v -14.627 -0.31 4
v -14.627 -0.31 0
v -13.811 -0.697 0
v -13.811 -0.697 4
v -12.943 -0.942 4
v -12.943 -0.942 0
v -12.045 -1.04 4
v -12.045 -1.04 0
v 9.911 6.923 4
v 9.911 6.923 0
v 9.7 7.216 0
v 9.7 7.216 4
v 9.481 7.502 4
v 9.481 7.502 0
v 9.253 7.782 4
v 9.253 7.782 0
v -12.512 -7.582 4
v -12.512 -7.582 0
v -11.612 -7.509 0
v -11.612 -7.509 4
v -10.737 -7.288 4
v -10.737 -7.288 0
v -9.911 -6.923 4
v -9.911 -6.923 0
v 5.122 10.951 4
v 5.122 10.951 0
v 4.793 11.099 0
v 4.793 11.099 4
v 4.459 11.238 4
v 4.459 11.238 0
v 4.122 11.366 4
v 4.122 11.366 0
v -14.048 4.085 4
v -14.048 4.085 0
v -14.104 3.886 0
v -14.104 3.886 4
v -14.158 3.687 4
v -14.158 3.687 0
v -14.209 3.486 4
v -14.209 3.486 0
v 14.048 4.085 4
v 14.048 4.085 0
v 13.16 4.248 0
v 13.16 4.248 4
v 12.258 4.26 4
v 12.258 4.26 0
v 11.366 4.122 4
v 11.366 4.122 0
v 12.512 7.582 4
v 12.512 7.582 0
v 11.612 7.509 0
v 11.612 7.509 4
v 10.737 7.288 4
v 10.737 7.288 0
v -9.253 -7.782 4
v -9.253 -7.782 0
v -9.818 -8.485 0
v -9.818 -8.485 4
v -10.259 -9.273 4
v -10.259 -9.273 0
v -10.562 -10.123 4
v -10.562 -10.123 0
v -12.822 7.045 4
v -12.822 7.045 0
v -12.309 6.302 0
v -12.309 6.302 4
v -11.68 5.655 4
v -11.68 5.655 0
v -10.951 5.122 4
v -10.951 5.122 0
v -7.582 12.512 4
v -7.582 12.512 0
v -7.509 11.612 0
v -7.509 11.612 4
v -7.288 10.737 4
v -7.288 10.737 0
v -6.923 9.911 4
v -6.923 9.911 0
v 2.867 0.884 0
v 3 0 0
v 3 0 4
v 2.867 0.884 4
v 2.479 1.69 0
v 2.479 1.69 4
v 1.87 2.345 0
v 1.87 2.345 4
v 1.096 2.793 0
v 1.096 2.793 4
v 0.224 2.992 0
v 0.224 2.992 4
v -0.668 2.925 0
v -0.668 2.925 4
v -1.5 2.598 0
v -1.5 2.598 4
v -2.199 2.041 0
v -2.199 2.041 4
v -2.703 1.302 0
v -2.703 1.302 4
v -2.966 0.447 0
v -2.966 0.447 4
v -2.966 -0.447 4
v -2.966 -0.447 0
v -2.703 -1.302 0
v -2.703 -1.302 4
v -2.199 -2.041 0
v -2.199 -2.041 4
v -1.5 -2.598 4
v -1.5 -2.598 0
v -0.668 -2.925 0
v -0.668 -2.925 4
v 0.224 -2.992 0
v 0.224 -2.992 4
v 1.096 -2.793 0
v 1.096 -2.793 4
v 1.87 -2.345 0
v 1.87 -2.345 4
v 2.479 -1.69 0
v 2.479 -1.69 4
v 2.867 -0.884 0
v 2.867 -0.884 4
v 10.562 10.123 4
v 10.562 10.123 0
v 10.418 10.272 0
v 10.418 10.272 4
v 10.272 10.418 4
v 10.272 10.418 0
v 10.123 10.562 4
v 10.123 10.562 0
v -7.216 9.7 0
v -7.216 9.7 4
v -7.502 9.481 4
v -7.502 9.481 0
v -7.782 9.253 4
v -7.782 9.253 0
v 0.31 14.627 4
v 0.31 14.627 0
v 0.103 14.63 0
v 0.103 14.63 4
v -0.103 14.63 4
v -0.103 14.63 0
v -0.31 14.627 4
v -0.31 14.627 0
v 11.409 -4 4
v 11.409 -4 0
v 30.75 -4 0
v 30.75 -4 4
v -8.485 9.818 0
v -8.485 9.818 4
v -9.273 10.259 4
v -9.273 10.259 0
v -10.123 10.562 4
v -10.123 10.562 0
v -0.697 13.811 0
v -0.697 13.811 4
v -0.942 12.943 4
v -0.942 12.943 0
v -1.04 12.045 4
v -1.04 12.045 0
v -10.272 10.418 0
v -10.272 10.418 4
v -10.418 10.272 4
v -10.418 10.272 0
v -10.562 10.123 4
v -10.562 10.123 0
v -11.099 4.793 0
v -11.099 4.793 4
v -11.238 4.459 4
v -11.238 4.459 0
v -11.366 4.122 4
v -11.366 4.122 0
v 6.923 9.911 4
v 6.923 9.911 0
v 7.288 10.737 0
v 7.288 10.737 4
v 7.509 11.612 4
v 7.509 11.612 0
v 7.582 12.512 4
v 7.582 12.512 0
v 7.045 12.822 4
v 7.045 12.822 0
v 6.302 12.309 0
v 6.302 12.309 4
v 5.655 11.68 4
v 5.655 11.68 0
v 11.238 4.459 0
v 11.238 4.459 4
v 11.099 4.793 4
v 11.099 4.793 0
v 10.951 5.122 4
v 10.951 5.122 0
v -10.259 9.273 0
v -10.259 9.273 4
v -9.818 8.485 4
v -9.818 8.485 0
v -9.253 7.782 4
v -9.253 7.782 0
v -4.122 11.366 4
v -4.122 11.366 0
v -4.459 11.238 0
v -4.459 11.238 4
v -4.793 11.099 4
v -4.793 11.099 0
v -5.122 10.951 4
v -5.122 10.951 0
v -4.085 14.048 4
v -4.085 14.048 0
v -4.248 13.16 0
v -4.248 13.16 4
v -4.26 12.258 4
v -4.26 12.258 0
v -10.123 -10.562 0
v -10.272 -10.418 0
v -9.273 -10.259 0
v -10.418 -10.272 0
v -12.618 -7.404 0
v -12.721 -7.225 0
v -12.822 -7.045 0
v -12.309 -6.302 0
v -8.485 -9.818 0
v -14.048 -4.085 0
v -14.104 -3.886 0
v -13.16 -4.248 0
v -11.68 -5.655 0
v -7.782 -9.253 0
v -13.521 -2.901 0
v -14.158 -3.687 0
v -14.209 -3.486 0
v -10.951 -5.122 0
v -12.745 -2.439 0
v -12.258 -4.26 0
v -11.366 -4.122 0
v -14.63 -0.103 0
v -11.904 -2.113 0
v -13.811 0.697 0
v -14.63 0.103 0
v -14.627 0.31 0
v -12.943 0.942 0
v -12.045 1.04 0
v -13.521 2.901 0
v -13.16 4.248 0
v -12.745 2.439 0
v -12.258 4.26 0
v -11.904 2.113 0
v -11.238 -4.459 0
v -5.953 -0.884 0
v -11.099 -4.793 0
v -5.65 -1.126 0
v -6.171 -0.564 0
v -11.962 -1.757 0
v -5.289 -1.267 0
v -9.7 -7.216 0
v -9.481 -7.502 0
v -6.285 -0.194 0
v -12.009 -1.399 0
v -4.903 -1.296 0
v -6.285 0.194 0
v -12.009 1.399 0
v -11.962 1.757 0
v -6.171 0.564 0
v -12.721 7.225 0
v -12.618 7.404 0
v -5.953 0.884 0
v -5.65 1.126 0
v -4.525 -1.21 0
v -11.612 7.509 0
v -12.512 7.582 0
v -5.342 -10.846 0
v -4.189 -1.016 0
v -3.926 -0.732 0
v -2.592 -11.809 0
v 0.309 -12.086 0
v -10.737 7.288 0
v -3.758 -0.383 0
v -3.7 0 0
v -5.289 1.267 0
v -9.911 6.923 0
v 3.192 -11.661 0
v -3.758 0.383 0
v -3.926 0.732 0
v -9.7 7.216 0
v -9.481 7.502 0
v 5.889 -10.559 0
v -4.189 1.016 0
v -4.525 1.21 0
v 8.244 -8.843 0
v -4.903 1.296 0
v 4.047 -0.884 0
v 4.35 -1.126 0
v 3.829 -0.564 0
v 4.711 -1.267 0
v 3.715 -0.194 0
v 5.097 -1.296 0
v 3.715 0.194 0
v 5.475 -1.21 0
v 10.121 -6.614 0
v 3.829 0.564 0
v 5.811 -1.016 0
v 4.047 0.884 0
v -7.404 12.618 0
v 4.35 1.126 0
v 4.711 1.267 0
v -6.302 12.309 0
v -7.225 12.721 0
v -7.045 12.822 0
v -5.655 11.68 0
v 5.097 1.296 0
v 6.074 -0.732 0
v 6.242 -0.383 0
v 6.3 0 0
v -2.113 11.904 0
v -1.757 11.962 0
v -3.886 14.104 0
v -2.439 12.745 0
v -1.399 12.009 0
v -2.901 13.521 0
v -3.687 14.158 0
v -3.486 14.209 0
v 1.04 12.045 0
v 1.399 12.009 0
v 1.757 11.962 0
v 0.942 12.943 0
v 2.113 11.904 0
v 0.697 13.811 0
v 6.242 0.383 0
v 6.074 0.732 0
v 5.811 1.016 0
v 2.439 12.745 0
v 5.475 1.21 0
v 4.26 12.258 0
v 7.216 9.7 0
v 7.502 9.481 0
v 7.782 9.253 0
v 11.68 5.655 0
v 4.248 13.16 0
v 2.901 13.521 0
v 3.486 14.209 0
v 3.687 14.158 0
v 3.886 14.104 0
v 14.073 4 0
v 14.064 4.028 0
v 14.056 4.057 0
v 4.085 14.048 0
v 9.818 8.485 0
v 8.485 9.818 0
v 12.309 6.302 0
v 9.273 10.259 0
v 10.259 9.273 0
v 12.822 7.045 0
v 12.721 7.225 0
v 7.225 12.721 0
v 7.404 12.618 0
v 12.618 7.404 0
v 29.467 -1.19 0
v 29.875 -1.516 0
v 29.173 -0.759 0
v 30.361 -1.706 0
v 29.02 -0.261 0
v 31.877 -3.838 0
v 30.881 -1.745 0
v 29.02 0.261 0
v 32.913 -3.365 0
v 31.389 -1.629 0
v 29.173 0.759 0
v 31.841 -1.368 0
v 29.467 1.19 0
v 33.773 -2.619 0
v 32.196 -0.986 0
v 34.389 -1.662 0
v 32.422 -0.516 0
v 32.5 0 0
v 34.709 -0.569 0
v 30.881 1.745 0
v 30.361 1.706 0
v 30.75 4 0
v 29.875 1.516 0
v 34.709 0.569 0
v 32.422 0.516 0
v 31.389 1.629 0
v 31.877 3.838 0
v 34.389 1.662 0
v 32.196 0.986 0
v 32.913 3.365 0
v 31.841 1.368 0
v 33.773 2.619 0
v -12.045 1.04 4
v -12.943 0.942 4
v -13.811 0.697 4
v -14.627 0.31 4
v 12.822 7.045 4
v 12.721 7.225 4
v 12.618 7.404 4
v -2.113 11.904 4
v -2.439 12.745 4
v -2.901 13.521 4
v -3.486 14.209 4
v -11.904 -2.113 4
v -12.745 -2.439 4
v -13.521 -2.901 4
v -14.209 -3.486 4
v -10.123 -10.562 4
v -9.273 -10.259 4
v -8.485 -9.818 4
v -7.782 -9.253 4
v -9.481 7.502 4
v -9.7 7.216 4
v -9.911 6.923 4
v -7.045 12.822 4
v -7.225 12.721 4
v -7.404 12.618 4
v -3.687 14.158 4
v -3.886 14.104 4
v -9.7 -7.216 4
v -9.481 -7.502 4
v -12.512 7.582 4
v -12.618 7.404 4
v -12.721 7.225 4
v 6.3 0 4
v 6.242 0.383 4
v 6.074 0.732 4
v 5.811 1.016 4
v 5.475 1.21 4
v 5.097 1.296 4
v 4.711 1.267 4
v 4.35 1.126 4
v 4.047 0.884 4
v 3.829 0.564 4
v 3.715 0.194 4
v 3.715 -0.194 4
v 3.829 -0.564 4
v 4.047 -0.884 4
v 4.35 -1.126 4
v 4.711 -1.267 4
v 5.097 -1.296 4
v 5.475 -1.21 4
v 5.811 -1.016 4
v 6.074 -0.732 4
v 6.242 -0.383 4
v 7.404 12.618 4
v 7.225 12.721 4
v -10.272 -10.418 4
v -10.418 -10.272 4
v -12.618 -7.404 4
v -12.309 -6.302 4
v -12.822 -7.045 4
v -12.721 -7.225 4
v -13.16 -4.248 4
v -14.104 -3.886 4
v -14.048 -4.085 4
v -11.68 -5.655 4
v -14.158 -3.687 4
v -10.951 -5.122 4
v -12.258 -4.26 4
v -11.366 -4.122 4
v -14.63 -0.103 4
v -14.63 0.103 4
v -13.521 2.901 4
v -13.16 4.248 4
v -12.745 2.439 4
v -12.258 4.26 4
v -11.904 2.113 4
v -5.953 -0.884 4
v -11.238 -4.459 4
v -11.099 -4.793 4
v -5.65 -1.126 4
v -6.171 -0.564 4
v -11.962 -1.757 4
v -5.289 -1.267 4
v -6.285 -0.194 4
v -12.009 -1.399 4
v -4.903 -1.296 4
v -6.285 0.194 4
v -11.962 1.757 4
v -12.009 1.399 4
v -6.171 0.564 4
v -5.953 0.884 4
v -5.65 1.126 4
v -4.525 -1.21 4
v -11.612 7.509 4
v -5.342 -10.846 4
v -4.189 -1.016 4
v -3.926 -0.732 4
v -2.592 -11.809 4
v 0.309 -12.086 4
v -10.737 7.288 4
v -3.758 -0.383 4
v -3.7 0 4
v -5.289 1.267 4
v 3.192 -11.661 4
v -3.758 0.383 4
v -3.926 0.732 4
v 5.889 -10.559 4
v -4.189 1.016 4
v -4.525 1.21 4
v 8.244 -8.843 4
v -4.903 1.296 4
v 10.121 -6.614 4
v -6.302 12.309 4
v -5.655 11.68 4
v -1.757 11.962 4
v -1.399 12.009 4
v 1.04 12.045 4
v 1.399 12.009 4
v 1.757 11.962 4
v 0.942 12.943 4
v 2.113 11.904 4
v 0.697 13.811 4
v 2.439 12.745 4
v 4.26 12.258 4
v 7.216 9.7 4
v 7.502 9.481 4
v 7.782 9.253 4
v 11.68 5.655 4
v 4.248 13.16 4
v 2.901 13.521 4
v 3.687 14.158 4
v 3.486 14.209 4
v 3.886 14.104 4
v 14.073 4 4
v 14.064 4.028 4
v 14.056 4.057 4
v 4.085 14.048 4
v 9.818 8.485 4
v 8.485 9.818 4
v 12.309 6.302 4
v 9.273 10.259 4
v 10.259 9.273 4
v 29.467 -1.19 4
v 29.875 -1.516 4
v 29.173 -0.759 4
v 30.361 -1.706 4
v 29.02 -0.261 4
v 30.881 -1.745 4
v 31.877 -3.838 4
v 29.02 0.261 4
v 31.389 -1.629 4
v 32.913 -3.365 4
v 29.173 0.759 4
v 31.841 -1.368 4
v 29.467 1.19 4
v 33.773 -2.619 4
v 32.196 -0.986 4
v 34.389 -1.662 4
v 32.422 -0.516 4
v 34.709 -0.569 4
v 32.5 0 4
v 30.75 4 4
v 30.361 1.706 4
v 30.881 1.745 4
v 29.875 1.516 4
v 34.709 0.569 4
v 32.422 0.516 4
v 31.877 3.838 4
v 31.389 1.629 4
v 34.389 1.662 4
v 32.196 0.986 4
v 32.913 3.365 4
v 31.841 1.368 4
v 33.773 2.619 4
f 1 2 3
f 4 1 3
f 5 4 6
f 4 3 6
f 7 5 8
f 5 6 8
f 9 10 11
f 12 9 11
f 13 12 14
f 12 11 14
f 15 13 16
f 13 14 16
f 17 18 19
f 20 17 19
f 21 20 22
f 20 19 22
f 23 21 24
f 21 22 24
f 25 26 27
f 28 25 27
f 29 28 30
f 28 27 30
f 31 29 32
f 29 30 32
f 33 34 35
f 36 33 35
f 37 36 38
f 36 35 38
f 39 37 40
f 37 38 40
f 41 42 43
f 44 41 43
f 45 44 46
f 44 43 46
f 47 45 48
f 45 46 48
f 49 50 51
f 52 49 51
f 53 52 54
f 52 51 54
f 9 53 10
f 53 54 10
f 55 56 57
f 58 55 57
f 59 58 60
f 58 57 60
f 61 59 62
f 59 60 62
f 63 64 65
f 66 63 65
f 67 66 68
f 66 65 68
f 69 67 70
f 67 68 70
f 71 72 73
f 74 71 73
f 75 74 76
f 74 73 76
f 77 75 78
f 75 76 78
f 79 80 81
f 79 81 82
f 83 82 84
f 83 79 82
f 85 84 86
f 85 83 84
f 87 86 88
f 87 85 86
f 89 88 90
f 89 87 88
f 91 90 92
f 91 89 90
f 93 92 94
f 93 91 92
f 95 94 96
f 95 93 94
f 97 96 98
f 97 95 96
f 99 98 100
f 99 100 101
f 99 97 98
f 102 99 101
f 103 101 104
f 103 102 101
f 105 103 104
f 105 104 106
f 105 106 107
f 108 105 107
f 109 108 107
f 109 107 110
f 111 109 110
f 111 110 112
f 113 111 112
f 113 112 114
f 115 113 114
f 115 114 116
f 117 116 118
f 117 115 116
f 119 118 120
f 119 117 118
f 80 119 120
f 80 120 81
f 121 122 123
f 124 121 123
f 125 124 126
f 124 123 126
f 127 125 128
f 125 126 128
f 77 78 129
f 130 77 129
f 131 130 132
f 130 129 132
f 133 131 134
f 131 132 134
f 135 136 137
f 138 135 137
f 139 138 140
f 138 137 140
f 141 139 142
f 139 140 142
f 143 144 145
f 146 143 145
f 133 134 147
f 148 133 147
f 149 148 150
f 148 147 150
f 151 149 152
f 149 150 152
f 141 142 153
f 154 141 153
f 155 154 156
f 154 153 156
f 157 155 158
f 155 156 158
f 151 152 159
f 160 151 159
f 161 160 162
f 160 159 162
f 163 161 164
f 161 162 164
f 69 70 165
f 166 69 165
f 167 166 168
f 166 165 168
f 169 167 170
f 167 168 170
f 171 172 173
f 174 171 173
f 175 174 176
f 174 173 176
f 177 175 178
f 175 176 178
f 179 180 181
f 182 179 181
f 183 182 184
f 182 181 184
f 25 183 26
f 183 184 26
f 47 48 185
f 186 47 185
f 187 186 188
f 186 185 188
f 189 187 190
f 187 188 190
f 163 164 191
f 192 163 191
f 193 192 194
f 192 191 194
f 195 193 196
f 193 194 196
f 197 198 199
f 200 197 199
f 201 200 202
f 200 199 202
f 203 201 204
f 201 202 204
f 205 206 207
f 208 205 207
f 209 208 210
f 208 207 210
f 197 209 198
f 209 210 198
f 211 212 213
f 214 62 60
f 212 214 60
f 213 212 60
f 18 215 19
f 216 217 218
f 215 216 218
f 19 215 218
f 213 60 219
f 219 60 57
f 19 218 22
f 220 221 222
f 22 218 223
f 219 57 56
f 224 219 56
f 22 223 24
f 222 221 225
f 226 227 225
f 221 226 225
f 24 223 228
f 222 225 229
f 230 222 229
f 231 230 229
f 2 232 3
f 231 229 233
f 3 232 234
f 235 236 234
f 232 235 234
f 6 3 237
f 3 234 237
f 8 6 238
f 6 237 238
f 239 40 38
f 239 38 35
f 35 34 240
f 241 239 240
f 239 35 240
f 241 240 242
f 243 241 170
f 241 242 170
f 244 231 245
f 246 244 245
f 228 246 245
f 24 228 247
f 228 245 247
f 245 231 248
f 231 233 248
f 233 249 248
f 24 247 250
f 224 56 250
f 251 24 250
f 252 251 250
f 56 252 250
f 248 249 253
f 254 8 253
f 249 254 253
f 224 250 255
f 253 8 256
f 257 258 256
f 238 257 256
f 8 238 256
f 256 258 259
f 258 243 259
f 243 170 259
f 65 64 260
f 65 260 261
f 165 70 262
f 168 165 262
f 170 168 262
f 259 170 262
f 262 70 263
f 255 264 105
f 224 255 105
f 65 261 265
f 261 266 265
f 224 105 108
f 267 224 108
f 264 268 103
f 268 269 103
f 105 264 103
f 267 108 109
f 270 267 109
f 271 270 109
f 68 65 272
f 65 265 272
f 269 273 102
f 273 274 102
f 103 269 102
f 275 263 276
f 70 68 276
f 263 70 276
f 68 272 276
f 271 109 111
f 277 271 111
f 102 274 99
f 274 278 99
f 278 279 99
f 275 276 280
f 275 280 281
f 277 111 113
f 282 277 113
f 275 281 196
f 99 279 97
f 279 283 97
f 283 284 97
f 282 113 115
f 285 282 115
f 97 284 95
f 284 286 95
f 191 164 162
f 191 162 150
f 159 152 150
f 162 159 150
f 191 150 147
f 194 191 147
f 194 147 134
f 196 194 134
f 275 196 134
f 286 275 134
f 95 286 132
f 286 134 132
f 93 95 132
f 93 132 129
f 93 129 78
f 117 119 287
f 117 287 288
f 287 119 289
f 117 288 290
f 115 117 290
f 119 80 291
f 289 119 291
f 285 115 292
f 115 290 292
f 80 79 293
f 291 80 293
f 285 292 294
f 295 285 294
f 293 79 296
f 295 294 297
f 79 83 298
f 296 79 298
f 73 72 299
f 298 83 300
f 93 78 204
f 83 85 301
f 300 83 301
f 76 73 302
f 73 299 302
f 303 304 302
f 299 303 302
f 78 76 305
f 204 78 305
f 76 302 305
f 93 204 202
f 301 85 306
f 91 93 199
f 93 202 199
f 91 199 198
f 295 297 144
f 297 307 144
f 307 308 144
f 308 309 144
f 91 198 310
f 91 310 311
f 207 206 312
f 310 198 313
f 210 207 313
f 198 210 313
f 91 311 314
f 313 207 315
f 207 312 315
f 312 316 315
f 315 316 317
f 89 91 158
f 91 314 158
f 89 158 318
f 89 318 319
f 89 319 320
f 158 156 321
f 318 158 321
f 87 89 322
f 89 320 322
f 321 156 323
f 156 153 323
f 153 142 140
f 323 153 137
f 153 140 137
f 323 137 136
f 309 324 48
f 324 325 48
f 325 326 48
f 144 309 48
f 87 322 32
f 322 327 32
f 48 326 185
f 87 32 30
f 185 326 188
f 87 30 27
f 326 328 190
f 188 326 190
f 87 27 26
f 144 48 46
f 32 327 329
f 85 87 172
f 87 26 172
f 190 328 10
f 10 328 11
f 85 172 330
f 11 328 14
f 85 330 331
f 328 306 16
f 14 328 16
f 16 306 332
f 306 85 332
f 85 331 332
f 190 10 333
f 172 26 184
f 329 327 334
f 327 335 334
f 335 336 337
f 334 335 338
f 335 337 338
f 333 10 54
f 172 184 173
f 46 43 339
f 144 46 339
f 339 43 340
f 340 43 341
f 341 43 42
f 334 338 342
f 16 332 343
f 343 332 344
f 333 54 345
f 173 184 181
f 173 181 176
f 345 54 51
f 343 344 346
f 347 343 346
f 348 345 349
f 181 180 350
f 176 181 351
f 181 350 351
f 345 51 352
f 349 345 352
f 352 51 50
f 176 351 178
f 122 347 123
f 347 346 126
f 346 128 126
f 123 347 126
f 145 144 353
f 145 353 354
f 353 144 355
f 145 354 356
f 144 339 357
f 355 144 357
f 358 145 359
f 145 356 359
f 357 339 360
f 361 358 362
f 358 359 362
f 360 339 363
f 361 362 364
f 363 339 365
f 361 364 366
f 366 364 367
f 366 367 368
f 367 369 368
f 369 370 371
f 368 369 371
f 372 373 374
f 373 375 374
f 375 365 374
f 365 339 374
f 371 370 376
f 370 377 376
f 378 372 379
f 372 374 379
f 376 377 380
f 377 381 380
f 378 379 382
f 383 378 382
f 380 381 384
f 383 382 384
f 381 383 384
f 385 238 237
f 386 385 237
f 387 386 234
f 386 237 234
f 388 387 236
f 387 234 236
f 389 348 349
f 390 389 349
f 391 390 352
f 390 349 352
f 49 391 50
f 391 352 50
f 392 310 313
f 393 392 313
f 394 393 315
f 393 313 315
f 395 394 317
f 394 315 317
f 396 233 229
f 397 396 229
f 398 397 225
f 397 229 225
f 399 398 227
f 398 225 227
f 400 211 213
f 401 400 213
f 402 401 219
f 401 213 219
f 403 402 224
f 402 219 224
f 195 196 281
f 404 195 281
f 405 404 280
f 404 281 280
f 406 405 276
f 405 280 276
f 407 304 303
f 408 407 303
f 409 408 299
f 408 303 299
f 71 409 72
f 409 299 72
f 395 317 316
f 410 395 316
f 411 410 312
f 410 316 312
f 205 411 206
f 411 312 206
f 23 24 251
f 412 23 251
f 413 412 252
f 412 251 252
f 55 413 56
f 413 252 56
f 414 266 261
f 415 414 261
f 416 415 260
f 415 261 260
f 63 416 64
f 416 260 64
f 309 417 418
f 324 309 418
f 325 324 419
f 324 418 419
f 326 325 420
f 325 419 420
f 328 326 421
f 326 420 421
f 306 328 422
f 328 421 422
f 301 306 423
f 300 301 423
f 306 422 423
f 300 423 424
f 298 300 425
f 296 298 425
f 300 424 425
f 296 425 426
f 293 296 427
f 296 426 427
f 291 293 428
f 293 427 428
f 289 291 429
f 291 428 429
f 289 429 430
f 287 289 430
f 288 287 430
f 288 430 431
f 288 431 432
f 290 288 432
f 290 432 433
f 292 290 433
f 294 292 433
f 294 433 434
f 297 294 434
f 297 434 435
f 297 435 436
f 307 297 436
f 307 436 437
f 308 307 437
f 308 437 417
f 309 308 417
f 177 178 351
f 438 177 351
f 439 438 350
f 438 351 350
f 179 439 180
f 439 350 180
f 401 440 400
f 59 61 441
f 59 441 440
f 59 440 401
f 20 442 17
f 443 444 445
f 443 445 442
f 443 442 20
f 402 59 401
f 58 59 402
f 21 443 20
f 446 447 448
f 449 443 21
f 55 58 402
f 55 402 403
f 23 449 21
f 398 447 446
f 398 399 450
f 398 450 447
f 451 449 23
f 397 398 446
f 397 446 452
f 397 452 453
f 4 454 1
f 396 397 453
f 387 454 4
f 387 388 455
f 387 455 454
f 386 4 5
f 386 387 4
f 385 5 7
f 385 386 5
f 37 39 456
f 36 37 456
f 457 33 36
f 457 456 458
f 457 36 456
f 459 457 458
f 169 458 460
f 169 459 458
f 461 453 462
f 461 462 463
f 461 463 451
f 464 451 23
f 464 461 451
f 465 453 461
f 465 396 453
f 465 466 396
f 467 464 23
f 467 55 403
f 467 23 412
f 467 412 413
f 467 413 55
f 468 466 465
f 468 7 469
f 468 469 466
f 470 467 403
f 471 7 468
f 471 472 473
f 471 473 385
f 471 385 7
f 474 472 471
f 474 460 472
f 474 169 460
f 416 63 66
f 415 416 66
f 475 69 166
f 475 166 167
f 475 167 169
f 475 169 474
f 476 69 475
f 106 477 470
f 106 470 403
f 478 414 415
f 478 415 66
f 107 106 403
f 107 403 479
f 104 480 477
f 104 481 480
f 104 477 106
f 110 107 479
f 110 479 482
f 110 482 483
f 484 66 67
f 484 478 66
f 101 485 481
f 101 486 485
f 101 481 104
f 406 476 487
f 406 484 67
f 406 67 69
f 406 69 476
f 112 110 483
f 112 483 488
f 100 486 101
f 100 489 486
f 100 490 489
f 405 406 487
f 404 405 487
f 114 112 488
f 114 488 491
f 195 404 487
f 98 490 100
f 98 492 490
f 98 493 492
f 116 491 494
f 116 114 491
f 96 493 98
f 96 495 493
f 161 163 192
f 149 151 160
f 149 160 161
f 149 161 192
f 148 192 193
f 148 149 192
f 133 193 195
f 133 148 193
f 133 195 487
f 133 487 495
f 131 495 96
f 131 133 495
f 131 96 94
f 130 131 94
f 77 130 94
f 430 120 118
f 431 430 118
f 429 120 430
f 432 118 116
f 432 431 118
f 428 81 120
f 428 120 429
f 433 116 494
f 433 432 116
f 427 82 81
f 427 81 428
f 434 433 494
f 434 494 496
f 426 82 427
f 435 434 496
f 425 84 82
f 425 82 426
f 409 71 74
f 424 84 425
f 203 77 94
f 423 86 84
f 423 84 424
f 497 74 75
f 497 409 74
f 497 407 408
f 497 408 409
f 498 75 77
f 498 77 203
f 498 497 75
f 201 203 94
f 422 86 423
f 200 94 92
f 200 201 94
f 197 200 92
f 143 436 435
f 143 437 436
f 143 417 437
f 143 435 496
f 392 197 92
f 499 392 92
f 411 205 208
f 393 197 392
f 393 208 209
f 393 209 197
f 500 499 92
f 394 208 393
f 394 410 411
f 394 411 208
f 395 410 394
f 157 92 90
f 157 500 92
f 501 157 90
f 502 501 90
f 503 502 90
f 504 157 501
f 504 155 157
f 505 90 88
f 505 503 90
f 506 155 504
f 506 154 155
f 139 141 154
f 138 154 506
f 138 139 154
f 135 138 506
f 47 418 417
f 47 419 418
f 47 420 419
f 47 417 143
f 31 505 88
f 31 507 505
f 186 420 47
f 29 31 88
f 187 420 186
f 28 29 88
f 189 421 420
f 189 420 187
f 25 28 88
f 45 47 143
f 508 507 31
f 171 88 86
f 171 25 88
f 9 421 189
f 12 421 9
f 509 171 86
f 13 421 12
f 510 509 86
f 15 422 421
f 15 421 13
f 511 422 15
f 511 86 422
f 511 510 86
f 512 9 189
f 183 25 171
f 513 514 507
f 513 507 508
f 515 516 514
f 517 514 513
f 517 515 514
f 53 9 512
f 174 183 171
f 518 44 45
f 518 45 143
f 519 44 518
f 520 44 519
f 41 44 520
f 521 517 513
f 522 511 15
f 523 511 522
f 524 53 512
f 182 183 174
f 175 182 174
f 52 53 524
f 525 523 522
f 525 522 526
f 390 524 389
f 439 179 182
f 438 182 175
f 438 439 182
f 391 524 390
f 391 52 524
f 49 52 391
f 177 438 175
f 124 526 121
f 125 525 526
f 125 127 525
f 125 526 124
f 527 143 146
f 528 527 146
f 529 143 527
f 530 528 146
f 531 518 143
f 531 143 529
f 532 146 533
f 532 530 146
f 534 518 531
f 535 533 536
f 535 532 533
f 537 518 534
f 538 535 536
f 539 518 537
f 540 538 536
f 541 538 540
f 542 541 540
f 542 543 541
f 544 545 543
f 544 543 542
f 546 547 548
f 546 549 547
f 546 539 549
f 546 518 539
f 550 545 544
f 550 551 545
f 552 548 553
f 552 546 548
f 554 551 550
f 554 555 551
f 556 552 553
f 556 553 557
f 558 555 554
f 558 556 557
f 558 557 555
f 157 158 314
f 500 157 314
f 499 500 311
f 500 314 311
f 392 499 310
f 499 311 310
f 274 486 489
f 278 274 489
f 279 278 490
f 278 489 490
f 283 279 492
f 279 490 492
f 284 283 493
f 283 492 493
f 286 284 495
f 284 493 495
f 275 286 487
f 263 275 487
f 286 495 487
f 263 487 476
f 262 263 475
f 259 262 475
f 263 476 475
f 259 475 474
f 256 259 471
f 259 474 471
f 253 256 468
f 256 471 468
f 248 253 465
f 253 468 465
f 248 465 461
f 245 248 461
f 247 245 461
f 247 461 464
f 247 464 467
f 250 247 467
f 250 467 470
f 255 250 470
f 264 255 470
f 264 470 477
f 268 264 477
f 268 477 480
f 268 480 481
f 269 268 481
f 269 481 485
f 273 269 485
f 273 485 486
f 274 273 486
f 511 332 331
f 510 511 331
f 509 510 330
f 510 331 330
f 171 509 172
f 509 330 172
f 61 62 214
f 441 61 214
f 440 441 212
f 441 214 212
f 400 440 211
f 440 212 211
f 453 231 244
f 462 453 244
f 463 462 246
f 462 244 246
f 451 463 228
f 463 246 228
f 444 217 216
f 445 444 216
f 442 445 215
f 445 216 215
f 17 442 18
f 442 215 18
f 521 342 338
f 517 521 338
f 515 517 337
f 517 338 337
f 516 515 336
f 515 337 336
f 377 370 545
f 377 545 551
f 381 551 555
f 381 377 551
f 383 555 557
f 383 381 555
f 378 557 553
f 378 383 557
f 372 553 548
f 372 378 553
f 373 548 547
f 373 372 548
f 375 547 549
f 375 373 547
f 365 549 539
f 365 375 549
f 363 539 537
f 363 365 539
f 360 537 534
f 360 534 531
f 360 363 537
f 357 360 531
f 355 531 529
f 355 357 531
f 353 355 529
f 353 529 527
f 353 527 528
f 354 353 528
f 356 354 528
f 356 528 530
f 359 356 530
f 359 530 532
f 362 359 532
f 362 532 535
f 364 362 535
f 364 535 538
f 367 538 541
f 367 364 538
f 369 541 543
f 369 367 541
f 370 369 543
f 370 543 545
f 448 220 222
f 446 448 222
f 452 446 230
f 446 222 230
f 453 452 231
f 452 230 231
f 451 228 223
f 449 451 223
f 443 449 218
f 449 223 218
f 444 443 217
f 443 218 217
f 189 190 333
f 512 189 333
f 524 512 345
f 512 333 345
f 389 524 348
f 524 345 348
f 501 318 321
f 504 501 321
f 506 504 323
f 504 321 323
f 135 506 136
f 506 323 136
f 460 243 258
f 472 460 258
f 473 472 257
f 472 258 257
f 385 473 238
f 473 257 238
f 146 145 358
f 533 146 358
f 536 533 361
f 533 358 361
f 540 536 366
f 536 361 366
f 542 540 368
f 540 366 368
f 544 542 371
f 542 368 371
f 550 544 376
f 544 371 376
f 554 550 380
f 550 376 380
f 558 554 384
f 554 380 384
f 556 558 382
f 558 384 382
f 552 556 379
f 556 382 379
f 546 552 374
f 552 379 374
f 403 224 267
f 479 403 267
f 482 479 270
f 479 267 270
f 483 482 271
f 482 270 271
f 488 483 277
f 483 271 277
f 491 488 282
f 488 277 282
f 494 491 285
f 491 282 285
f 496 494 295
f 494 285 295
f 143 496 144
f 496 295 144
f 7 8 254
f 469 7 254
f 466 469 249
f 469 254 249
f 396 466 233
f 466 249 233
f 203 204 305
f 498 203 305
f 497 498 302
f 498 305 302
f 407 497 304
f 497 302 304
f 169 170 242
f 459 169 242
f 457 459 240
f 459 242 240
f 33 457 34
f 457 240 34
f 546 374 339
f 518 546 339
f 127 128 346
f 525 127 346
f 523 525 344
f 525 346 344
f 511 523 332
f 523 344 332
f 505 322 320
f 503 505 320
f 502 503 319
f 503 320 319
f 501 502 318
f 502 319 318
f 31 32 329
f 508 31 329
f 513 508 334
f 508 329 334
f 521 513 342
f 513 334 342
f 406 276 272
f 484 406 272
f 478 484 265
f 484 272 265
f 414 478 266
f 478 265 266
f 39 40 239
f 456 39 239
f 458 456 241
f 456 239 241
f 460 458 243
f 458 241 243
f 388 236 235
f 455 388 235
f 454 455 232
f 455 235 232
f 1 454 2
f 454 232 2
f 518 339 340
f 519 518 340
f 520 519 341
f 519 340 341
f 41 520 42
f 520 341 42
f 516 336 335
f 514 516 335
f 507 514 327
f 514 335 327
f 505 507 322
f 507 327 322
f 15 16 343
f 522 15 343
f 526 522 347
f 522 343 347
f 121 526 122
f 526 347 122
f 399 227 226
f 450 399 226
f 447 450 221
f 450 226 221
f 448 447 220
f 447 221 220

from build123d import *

# Parameters (mm, degrees)
SKETCH1_R           = 1.75
SKETCH1_R_2         = 3
BOSS_EXTRUDE3_DEPTH = 4
SKETCH7_R           = 1.3
CUT_EXTRUDE1_DEPTH  = 5


with BuildPart() as part:
    # Sketch1 → Boss-Extrude3 (new body)
    with BuildSketch(Plane.XY):
        with BuildLine():
            ThreePointArc((30.75, -4), (34.75, 0), (30.75, 4))
            Line((30.75, 4), (14.072558403, 4))
            ThreePointArc((14.072558403, 4), (14.06038767, 4.04257326), (14.048088143, 4.085109489))
            ThreePointArc((14.048088143, 4.085109489), (12.709169027, 4.272836063), (11.365584201, 4.122086336))
            ThreePointArc((11.365584201, 4.122086336), (11.169703548, 4.626642697), (10.951436862, 5.12192646))
            ThreePointArc((10.951436862, 5.12192646), (12.008090957, 5.965388247), (12.82210701, 7.044889767))
            ThreePointArc((12.82210701, 7.044889767), (12.669951657, 7.315), (12.51210701, 7.581825517))
            ThreePointArc((12.51210701, 7.581825517), (11.170223244, 7.416617696), (9.911436862, 6.9232593))
            ThreePointArc((9.911436862, 6.9232593), (9.591641884, 7.359925677), (9.252623584, 7.781841479))
            ThreePointArc((9.252623584, 7.781841479), (10.05496909, 8.870045207), (10.561852666, 10.123446462))
            ThreePointArc((10.561852666, 10.123446462), (10.344972209, 10.344972209), (10.123446462, 10.561852666))
            ThreePointArc((10.123446462, 10.561852666), (8.870045207, 10.05496909), (7.781841479, 9.252623584))
            ThreePointArc((7.781841479, 9.252623584), (7.359925677, 9.591641884), (6.9232593, 9.911436862))
            ThreePointArc((6.9232593, 9.911436862), (7.416617696, 11.170223244), (7.581825517, 12.51210701))
            ThreePointArc((7.581825517, 12.51210701), (7.315, 12.669951657), (7.044889767, 12.82210701))
            ThreePointArc((7.044889767, 12.82210701), (5.965388247, 12.008090957), (5.12192646, 10.951436862))
            ThreePointArc((5.12192646, 10.951436862), (4.626642697, 11.169703548), (4.122086336, 11.365584201))
            ThreePointArc((4.122086336, 11.365584201), (4.272836063, 12.709169027), (4.085109489, 14.048088143))
            ThreePointArc((4.085109489, 14.048088143), (3.78652263, 14.131494839), (3.486235477, 14.208555951))
            ThreePointArc((3.486235477, 14.208555951), (2.654199937, 13.14288127), (2.112960617, 11.903927815))
            ThreePointArc((2.112960617, 11.903927815), (1.578061664, 11.986568374), (1.04, 12.04518576))
            ThreePointArc((1.04, 12.04518576), (0.837867713, 13.382005944), (0.31, 14.626715284))
            ThreePointArc((0.31, 14.626715284), (0, 14.63), (-0.31, 14.626715284))
            ThreePointArc((-0.31, 14.626715284), (-0.837867713, 13.382005944), (-1.04, 12.04518576))
            ThreePointArc((-1.04, 12.04518576), (-1.578061664, 11.986568374), (-2.112960617, 11.903927815))
            ThreePointArc((-2.112960617, 11.903927815), (-2.654199937, 13.14288127), (-3.486235477, 14.208555951))
            ThreePointArc((-3.486235477, 14.208555951), (-3.78652263, 14.131494839), (-4.085109489, 14.048088143))
            ThreePointArc((-4.085109489, 14.048088143), (-4.272836063, 12.709169027), (-4.122086336, 11.365584201))
            ThreePointArc((-4.122086336, 11.365584201), (-4.626642697, 11.169703548), (-5.12192646, 10.951436862))
            ThreePointArc((-5.12192646, 10.951436862), (-5.965388247, 12.008090957), (-7.044889767, 12.82210701))
            ThreePointArc((-7.044889767, 12.82210701), (-7.315, 12.669951657), (-7.581825517, 12.51210701))
            ThreePointArc((-7.581825517, 12.51210701), (-7.416617696, 11.170223244), (-6.9232593, 9.911436862))
            ThreePointArc((-6.9232593, 9.911436862), (-7.359925677, 9.591641884), (-7.781841479, 9.252623584))
            ThreePointArc((-7.781841479, 9.252623584), (-8.870045207, 10.05496909), (-10.123446462, 10.561852666))
            ThreePointArc((-10.123446462, 10.561852666), (-10.344972209, 10.344972209), (-10.561852666, 10.123446462))
            ThreePointArc((-10.561852666, 10.123446462), (-10.05496909, 8.870045207), (-9.252623584, 7.781841479))
            ThreePointArc((-9.252623584, 7.781841479), (-9.591641884, 7.359925677), (-9.911436862, 6.9232593))
            ThreePointArc((-9.911436862, 6.9232593), (-11.170223244, 7.416617696), (-12.51210701, 7.581825517))
            ThreePointArc((-12.51210701, 7.581825517), (-12.669951657, 7.315), (-12.82210701, 7.044889767))
            ThreePointArc((-12.82210701, 7.044889767), (-12.008090957, 5.965388247), (-10.951436862, 5.12192646))
            ThreePointArc((-10.951436862, 5.12192646), (-11.169703548, 4.626642697), (-11.365584201, 4.122086336))
            ThreePointArc((-11.365584201, 4.122086336), (-12.709169027, 4.272836063), (-14.048088143, 4.085109489))
            ThreePointArc((-14.048088143, 4.085109489), (-14.131494839, 3.78652263), (-14.208555951, 3.486235477))
            ThreePointArc((-14.208555951, 3.486235477), (-13.14288127, 2.654199937), (-11.903927815, 2.112960617))
            ThreePointArc((-11.903927815, 2.112960617), (-11.986568374, 1.578061664), (-12.04518576, 1.04))
            ThreePointArc((-12.04518576, 1.04), (-13.382005944, 0.837867713), (-14.626715284, 0.31))
            ThreePointArc((-14.626715284, 0.31), (-14.63, 0), (-14.626715284, -0.31))
            ThreePointArc((-14.626715284, -0.31), (-13.382005944, -0.837867713), (-12.04518576, -1.04))
            ThreePointArc((-12.04518576, -1.04), (-11.986568374, -1.578061664), (-11.903927815, -2.112960617))
            ThreePointArc((-11.903927815, -2.112960617), (-13.14288127, -2.654199937), (-14.208555951, -3.486235477))
            ThreePointArc((-14.208555951, -3.486235477), (-14.131494839, -3.78652263), (-14.048088143, -4.085109489))
            ThreePointArc((-14.048088143, -4.085109489), (-12.709169027, -4.272836063), (-11.365584201, -4.122086336))
            ThreePointArc((-11.365584201, -4.122086336), (-11.169703548, -4.626642697), (-10.951436862, -5.12192646))
            ThreePointArc((-10.951436862, -5.12192646), (-12.008090957, -5.965388247), (-12.82210701, -7.044889767))
            ThreePointArc((-12.82210701, -7.044889767), (-12.669951657, -7.315), (-12.51210701, -7.581825517))
            ThreePointArc((-12.51210701, -7.581825517), (-11.170223244, -7.416617696), (-9.911436862, -6.9232593))
            ThreePointArc((-9.911436862, -6.9232593), (-9.591641884, -7.359925677), (-9.252623584, -7.781841479))
            ThreePointArc((-9.252623584, -7.781841479), (-10.05496909, -8.870045207), (-10.561852666, -10.123446462))
            ThreePointArc((-10.561852666, -10.123446462), (-10.344972209, -10.344972209), (-10.123446462, -10.561852666))
            ThreePointArc((-10.123446462, -10.561852666), (-8.870045207, -10.05496909), (-7.781841479, -9.252623584))
            ThreePointArc((-7.781841479, -9.252623584), (3.191677838, -11.661101688), (11.409123542, -4))
            Line((11.409123542, -4), (30.75, -4))
        make_face()
        with Locations((30.75, 0)):
            Circle(SKETCH1_R, mode=Mode.SUBTRACT)
        Circle(SKETCH1_R_2, mode=Mode.SUBTRACT)
    extrude(amount=BOSS_EXTRUDE3_DEPTH)

    # Sketch7 → Cut-Extrude1 (cut, through all)
    with BuildSketch(Plane.XY.offset(4)):
        with Locations((5, 0)):
            Circle(SKETCH7_R)
        with Locations((-5, 0)):
            Circle(SKETCH7_R)
    extrude(amount=-CUT_EXTRUDE1_DEPTH, mode=Mode.SUBTRACT)


solid = part.part
